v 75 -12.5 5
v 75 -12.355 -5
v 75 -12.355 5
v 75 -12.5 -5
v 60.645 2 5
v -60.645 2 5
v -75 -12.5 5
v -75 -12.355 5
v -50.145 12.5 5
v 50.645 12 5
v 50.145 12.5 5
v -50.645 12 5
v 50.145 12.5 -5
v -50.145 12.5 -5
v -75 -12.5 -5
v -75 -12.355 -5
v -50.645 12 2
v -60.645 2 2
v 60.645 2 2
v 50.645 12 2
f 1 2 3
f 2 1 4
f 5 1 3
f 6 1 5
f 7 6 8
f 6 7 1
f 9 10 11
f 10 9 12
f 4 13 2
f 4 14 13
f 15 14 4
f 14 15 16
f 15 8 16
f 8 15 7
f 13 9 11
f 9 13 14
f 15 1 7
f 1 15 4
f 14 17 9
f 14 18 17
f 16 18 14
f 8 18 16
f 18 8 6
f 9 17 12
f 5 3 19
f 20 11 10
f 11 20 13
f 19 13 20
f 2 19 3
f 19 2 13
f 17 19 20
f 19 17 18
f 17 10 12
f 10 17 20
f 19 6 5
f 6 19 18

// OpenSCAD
// Definition size of housing
// **************************

sizex = 150;
sizey = 25;
depth = 10;
thick = 2;
gap=2.5;

//Definition of circle angular resolution
resol        = 36;  


union () {
 difference () {
 
   // main block
   translate ([0,0,0]) {
     cube ( [sizex, sizey, depth], center=true );
   };
     
   //angled end
   translate ([-sizex/2,sizey-2,0]) {
   rotate ([0,0,45])
   cube ( [sizey*2, sizey*2, depth+10], center=true);
   };
   translate ([sizex/2,sizey-2,0]) {
   rotate ([0,0,-45])
   cube ( [sizey*2, sizey*2, depth+10], center=true);
   };
   
   //remove inner
   translate ([-sizex/2,thick,thick]) {
   cube ( [sizex, depth, sizey]);
   };

         
 };      



 
 //add support fins
   /*
   translate ([2,thick,thick+gap]) {
   cube ( [sizex/2-thick*2-5, depth-2 , thick]);
   };

   translate ([+2 -sizex/2 +5 ,thick,thick+gap]) {
   cube ( [sizex/2-thick*2-5, depth-2 , thick]);
   };

   translate ([sizex/2-gap-thick,thick,thick+gap+5]) {
   cube ( [thick, depth-2 , sizex-thick*2 - 20]);
   };

   translate ([-(sizex/2-thick),thick,thick+gap+5]) {
   cube ( [thick, depth-2 , sizex-thick*2 - 20]);
   };
 */
}
